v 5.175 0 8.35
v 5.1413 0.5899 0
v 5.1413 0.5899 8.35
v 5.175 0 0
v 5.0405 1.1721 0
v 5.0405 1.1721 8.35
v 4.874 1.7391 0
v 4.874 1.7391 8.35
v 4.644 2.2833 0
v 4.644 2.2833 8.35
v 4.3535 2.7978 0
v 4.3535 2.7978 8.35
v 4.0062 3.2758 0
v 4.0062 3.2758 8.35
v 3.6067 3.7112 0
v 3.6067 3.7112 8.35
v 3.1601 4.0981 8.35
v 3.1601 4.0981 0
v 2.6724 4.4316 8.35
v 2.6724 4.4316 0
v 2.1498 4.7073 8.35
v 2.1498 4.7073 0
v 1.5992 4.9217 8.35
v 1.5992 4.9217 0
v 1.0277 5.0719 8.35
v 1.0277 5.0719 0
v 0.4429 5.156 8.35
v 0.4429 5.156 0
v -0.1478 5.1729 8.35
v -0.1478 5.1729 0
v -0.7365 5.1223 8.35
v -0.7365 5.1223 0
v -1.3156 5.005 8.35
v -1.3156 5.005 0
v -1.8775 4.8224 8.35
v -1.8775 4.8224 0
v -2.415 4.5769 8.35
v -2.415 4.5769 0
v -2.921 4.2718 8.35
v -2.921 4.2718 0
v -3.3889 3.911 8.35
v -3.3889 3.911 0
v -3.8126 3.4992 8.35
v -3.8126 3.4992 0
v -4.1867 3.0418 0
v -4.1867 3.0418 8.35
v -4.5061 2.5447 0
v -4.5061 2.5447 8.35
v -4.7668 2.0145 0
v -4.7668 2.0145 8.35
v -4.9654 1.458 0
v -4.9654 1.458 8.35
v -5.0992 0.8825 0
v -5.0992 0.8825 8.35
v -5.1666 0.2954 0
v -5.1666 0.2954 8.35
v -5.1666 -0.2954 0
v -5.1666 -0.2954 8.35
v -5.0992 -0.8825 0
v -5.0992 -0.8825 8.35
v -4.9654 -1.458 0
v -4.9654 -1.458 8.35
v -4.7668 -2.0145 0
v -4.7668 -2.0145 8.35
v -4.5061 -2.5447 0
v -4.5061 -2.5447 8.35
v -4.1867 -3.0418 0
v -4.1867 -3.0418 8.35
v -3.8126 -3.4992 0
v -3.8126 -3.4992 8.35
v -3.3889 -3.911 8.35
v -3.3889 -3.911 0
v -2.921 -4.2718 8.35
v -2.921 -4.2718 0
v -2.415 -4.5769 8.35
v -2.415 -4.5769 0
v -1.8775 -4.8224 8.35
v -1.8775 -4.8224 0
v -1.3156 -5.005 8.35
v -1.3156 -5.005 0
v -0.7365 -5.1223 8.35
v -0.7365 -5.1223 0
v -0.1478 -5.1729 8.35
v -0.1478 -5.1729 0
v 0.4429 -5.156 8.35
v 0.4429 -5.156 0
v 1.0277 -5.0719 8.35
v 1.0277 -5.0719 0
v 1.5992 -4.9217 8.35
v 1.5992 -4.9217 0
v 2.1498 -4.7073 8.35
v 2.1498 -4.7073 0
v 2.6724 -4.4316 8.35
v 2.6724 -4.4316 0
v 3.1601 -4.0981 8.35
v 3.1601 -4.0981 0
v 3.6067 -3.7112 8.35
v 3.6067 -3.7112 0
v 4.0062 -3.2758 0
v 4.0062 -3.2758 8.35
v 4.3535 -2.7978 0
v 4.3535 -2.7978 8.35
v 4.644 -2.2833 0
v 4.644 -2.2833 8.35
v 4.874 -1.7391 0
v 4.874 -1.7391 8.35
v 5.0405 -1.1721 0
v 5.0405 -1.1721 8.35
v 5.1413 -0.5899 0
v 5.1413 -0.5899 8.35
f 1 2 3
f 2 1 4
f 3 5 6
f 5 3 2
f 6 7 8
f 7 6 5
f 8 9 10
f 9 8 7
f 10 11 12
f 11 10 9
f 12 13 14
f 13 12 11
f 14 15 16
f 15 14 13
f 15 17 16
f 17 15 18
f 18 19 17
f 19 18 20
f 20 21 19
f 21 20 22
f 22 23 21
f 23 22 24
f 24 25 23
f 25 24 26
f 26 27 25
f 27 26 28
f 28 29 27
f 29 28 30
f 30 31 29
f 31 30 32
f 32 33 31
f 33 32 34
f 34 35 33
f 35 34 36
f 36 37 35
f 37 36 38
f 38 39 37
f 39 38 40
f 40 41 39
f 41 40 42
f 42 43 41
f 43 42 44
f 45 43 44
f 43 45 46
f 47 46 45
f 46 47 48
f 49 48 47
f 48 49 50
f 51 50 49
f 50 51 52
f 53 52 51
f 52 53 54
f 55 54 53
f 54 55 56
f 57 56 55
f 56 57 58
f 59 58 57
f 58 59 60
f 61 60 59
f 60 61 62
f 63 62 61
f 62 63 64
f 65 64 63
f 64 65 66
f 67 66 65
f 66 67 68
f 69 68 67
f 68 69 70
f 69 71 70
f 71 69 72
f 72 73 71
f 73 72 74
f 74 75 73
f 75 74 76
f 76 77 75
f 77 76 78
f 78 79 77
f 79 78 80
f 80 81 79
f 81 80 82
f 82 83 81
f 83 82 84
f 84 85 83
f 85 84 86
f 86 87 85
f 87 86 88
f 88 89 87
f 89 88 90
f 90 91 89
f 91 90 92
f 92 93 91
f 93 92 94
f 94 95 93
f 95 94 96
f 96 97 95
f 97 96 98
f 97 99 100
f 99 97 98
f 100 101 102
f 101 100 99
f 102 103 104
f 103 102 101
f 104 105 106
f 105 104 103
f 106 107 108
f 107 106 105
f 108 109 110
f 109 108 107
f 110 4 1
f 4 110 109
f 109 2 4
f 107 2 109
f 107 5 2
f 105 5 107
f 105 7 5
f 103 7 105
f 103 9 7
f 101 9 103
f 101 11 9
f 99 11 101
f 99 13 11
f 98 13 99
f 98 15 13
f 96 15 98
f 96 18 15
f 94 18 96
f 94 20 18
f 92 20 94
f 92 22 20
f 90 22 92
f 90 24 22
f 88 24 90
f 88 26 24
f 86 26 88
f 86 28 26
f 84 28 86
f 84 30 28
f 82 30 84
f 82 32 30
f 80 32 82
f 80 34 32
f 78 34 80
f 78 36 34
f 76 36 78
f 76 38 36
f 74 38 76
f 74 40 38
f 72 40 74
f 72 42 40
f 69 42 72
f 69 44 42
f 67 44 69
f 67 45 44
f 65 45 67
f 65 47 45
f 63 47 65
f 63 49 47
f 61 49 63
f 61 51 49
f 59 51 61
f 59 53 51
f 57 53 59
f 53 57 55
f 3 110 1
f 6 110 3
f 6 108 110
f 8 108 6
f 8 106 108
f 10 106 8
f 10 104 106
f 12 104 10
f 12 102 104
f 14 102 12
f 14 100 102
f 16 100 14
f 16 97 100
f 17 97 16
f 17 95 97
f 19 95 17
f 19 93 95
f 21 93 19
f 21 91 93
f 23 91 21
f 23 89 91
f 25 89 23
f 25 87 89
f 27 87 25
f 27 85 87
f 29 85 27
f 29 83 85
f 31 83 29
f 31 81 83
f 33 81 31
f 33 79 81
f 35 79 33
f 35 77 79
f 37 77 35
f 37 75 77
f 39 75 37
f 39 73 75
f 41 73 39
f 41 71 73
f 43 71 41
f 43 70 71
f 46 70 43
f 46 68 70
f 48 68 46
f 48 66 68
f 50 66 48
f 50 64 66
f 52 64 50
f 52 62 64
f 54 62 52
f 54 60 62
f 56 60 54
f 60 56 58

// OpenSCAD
$fs = 0.6;
$fa = 6;

function in_to_mm(in) = in * 25.4;

magnet_diameter = in_to_mm(1/4);
magnet_height = in_to_mm(1/4);
base_wall_thickness = 2;


//calculated variables
magnet_radius = magnet_diameter / 2;
base_radius = magnet_radius + base_wall_thickness;
base_diameter = base_radius * 2;
base_height = magnet_height + base_wall_thickness;

module magnet() {
	cylinder(h = magnet_height, r = magnet_radius); 
}

module base() {
	cylinder(r = base_radius, h = base_height);
}

module top() {
	translate([0,0,base_height]){
		cylinder(h = 1, r = 1, center = false);
	}
}

base();
